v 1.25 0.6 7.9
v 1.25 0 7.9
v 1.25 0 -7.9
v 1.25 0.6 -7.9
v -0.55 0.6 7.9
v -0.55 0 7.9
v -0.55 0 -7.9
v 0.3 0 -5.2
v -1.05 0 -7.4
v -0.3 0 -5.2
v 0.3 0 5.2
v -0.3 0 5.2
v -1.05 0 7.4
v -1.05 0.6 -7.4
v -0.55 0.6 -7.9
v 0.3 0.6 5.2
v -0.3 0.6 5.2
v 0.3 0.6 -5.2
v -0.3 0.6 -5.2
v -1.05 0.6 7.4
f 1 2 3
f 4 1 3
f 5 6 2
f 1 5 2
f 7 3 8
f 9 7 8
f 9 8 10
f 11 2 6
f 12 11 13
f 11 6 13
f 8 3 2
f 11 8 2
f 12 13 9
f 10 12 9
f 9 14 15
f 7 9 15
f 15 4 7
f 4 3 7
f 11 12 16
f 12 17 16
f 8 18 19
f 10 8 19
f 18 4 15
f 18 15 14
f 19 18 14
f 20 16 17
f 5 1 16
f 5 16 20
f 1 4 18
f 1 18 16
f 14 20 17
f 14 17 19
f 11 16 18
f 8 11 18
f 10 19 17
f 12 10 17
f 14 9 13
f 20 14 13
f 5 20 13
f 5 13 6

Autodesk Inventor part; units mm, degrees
ref_plane "YZ Plane" through (0, 0, 0) normal (1, 0, 0) x (0, 1, 0)
ref_plane "XZ Plane" through (0, 0, 0) normal (0, 1, 0) x (-1, 0, 0)
ref_plane "XY Plane" through (0, 0, 0) normal (0, 0, 1) x (1, 0, 0)
sketch "Sketch1" plane through (0, 0, 0) normal (0, 1, 0) x (-1, 0, 0)
  line L0 (-1.25, -7.9) -> (1.05, -7.9)
  line L1 (1.05, -7.9) -> (1.05, 7.9)
  line L2 (1.05, 7.9) -> (-1.25, 7.9)
  line L3 (-1.25, 7.9) -> (-1.25, -7.9)
  point P0 (0, 0)
  dimension "d0" = 15.8
  dimension "d7" = 1.05
  dimension "d8" = 1.25
  dimension "d15" = 7.9
extrude "Extrusion1" add sketch "Sketch1" along normal blind 0.6
sketch "Sketch2" plane through (0, 0.6, 0) normal (0, 1, 0) x (1, 0, 0)
  line L0 (0.3, 5.2) -> (-0.3, 5.2)
  line L1 (-0.3, 5.2) -> (-0.3, -5.2)
  line L2 (-0.3, -5.2) -> (0.3, -5.2)
  line L3 (0.3, -5.2) -> (0.3, 5.2)
  line L4 (0.3, 5.2) -> (-0.3, -5.2) construction
  line L5 (-0.3, 5.2) -> (0.3, -5.2) construction
  point P0 (0, 0)
  dimension "d3" = 0.6
  dimension "d4" = 10.4
extrude "Extrusion2" cut sketch "Sketch2" against normal through all
sketch "Sketch3" plane through (0, 0.6, 0) normal (0, 1, 0) x (1, 0, 0)
  line L0 (-1.05, 7.9) -> (-1.05, -7.9) projected
  line L1 (-1.05, -7.4) -> (-0.55, -7.9)
  line L2 (-1.05, -7.9) -> (1.25, -7.9) projected
  line L3 (1.25, 7.9) -> (-1.05, 7.9) projected
  line L4 (-1.05, 7.4) -> (-0.55, 7.9)
  point P0 (0, 0)
  dimension "d9" = 0.5
  dimension "d10" = 0.5
  dimension "d11" = 0.5
  dimension "d12" = 0.5
extrude "Extrusion3" cut sketch "Sketch3" against normal through all
equation "\"d15\" = 0.5 * d0"
properties part number "insert spacer - v4c"
